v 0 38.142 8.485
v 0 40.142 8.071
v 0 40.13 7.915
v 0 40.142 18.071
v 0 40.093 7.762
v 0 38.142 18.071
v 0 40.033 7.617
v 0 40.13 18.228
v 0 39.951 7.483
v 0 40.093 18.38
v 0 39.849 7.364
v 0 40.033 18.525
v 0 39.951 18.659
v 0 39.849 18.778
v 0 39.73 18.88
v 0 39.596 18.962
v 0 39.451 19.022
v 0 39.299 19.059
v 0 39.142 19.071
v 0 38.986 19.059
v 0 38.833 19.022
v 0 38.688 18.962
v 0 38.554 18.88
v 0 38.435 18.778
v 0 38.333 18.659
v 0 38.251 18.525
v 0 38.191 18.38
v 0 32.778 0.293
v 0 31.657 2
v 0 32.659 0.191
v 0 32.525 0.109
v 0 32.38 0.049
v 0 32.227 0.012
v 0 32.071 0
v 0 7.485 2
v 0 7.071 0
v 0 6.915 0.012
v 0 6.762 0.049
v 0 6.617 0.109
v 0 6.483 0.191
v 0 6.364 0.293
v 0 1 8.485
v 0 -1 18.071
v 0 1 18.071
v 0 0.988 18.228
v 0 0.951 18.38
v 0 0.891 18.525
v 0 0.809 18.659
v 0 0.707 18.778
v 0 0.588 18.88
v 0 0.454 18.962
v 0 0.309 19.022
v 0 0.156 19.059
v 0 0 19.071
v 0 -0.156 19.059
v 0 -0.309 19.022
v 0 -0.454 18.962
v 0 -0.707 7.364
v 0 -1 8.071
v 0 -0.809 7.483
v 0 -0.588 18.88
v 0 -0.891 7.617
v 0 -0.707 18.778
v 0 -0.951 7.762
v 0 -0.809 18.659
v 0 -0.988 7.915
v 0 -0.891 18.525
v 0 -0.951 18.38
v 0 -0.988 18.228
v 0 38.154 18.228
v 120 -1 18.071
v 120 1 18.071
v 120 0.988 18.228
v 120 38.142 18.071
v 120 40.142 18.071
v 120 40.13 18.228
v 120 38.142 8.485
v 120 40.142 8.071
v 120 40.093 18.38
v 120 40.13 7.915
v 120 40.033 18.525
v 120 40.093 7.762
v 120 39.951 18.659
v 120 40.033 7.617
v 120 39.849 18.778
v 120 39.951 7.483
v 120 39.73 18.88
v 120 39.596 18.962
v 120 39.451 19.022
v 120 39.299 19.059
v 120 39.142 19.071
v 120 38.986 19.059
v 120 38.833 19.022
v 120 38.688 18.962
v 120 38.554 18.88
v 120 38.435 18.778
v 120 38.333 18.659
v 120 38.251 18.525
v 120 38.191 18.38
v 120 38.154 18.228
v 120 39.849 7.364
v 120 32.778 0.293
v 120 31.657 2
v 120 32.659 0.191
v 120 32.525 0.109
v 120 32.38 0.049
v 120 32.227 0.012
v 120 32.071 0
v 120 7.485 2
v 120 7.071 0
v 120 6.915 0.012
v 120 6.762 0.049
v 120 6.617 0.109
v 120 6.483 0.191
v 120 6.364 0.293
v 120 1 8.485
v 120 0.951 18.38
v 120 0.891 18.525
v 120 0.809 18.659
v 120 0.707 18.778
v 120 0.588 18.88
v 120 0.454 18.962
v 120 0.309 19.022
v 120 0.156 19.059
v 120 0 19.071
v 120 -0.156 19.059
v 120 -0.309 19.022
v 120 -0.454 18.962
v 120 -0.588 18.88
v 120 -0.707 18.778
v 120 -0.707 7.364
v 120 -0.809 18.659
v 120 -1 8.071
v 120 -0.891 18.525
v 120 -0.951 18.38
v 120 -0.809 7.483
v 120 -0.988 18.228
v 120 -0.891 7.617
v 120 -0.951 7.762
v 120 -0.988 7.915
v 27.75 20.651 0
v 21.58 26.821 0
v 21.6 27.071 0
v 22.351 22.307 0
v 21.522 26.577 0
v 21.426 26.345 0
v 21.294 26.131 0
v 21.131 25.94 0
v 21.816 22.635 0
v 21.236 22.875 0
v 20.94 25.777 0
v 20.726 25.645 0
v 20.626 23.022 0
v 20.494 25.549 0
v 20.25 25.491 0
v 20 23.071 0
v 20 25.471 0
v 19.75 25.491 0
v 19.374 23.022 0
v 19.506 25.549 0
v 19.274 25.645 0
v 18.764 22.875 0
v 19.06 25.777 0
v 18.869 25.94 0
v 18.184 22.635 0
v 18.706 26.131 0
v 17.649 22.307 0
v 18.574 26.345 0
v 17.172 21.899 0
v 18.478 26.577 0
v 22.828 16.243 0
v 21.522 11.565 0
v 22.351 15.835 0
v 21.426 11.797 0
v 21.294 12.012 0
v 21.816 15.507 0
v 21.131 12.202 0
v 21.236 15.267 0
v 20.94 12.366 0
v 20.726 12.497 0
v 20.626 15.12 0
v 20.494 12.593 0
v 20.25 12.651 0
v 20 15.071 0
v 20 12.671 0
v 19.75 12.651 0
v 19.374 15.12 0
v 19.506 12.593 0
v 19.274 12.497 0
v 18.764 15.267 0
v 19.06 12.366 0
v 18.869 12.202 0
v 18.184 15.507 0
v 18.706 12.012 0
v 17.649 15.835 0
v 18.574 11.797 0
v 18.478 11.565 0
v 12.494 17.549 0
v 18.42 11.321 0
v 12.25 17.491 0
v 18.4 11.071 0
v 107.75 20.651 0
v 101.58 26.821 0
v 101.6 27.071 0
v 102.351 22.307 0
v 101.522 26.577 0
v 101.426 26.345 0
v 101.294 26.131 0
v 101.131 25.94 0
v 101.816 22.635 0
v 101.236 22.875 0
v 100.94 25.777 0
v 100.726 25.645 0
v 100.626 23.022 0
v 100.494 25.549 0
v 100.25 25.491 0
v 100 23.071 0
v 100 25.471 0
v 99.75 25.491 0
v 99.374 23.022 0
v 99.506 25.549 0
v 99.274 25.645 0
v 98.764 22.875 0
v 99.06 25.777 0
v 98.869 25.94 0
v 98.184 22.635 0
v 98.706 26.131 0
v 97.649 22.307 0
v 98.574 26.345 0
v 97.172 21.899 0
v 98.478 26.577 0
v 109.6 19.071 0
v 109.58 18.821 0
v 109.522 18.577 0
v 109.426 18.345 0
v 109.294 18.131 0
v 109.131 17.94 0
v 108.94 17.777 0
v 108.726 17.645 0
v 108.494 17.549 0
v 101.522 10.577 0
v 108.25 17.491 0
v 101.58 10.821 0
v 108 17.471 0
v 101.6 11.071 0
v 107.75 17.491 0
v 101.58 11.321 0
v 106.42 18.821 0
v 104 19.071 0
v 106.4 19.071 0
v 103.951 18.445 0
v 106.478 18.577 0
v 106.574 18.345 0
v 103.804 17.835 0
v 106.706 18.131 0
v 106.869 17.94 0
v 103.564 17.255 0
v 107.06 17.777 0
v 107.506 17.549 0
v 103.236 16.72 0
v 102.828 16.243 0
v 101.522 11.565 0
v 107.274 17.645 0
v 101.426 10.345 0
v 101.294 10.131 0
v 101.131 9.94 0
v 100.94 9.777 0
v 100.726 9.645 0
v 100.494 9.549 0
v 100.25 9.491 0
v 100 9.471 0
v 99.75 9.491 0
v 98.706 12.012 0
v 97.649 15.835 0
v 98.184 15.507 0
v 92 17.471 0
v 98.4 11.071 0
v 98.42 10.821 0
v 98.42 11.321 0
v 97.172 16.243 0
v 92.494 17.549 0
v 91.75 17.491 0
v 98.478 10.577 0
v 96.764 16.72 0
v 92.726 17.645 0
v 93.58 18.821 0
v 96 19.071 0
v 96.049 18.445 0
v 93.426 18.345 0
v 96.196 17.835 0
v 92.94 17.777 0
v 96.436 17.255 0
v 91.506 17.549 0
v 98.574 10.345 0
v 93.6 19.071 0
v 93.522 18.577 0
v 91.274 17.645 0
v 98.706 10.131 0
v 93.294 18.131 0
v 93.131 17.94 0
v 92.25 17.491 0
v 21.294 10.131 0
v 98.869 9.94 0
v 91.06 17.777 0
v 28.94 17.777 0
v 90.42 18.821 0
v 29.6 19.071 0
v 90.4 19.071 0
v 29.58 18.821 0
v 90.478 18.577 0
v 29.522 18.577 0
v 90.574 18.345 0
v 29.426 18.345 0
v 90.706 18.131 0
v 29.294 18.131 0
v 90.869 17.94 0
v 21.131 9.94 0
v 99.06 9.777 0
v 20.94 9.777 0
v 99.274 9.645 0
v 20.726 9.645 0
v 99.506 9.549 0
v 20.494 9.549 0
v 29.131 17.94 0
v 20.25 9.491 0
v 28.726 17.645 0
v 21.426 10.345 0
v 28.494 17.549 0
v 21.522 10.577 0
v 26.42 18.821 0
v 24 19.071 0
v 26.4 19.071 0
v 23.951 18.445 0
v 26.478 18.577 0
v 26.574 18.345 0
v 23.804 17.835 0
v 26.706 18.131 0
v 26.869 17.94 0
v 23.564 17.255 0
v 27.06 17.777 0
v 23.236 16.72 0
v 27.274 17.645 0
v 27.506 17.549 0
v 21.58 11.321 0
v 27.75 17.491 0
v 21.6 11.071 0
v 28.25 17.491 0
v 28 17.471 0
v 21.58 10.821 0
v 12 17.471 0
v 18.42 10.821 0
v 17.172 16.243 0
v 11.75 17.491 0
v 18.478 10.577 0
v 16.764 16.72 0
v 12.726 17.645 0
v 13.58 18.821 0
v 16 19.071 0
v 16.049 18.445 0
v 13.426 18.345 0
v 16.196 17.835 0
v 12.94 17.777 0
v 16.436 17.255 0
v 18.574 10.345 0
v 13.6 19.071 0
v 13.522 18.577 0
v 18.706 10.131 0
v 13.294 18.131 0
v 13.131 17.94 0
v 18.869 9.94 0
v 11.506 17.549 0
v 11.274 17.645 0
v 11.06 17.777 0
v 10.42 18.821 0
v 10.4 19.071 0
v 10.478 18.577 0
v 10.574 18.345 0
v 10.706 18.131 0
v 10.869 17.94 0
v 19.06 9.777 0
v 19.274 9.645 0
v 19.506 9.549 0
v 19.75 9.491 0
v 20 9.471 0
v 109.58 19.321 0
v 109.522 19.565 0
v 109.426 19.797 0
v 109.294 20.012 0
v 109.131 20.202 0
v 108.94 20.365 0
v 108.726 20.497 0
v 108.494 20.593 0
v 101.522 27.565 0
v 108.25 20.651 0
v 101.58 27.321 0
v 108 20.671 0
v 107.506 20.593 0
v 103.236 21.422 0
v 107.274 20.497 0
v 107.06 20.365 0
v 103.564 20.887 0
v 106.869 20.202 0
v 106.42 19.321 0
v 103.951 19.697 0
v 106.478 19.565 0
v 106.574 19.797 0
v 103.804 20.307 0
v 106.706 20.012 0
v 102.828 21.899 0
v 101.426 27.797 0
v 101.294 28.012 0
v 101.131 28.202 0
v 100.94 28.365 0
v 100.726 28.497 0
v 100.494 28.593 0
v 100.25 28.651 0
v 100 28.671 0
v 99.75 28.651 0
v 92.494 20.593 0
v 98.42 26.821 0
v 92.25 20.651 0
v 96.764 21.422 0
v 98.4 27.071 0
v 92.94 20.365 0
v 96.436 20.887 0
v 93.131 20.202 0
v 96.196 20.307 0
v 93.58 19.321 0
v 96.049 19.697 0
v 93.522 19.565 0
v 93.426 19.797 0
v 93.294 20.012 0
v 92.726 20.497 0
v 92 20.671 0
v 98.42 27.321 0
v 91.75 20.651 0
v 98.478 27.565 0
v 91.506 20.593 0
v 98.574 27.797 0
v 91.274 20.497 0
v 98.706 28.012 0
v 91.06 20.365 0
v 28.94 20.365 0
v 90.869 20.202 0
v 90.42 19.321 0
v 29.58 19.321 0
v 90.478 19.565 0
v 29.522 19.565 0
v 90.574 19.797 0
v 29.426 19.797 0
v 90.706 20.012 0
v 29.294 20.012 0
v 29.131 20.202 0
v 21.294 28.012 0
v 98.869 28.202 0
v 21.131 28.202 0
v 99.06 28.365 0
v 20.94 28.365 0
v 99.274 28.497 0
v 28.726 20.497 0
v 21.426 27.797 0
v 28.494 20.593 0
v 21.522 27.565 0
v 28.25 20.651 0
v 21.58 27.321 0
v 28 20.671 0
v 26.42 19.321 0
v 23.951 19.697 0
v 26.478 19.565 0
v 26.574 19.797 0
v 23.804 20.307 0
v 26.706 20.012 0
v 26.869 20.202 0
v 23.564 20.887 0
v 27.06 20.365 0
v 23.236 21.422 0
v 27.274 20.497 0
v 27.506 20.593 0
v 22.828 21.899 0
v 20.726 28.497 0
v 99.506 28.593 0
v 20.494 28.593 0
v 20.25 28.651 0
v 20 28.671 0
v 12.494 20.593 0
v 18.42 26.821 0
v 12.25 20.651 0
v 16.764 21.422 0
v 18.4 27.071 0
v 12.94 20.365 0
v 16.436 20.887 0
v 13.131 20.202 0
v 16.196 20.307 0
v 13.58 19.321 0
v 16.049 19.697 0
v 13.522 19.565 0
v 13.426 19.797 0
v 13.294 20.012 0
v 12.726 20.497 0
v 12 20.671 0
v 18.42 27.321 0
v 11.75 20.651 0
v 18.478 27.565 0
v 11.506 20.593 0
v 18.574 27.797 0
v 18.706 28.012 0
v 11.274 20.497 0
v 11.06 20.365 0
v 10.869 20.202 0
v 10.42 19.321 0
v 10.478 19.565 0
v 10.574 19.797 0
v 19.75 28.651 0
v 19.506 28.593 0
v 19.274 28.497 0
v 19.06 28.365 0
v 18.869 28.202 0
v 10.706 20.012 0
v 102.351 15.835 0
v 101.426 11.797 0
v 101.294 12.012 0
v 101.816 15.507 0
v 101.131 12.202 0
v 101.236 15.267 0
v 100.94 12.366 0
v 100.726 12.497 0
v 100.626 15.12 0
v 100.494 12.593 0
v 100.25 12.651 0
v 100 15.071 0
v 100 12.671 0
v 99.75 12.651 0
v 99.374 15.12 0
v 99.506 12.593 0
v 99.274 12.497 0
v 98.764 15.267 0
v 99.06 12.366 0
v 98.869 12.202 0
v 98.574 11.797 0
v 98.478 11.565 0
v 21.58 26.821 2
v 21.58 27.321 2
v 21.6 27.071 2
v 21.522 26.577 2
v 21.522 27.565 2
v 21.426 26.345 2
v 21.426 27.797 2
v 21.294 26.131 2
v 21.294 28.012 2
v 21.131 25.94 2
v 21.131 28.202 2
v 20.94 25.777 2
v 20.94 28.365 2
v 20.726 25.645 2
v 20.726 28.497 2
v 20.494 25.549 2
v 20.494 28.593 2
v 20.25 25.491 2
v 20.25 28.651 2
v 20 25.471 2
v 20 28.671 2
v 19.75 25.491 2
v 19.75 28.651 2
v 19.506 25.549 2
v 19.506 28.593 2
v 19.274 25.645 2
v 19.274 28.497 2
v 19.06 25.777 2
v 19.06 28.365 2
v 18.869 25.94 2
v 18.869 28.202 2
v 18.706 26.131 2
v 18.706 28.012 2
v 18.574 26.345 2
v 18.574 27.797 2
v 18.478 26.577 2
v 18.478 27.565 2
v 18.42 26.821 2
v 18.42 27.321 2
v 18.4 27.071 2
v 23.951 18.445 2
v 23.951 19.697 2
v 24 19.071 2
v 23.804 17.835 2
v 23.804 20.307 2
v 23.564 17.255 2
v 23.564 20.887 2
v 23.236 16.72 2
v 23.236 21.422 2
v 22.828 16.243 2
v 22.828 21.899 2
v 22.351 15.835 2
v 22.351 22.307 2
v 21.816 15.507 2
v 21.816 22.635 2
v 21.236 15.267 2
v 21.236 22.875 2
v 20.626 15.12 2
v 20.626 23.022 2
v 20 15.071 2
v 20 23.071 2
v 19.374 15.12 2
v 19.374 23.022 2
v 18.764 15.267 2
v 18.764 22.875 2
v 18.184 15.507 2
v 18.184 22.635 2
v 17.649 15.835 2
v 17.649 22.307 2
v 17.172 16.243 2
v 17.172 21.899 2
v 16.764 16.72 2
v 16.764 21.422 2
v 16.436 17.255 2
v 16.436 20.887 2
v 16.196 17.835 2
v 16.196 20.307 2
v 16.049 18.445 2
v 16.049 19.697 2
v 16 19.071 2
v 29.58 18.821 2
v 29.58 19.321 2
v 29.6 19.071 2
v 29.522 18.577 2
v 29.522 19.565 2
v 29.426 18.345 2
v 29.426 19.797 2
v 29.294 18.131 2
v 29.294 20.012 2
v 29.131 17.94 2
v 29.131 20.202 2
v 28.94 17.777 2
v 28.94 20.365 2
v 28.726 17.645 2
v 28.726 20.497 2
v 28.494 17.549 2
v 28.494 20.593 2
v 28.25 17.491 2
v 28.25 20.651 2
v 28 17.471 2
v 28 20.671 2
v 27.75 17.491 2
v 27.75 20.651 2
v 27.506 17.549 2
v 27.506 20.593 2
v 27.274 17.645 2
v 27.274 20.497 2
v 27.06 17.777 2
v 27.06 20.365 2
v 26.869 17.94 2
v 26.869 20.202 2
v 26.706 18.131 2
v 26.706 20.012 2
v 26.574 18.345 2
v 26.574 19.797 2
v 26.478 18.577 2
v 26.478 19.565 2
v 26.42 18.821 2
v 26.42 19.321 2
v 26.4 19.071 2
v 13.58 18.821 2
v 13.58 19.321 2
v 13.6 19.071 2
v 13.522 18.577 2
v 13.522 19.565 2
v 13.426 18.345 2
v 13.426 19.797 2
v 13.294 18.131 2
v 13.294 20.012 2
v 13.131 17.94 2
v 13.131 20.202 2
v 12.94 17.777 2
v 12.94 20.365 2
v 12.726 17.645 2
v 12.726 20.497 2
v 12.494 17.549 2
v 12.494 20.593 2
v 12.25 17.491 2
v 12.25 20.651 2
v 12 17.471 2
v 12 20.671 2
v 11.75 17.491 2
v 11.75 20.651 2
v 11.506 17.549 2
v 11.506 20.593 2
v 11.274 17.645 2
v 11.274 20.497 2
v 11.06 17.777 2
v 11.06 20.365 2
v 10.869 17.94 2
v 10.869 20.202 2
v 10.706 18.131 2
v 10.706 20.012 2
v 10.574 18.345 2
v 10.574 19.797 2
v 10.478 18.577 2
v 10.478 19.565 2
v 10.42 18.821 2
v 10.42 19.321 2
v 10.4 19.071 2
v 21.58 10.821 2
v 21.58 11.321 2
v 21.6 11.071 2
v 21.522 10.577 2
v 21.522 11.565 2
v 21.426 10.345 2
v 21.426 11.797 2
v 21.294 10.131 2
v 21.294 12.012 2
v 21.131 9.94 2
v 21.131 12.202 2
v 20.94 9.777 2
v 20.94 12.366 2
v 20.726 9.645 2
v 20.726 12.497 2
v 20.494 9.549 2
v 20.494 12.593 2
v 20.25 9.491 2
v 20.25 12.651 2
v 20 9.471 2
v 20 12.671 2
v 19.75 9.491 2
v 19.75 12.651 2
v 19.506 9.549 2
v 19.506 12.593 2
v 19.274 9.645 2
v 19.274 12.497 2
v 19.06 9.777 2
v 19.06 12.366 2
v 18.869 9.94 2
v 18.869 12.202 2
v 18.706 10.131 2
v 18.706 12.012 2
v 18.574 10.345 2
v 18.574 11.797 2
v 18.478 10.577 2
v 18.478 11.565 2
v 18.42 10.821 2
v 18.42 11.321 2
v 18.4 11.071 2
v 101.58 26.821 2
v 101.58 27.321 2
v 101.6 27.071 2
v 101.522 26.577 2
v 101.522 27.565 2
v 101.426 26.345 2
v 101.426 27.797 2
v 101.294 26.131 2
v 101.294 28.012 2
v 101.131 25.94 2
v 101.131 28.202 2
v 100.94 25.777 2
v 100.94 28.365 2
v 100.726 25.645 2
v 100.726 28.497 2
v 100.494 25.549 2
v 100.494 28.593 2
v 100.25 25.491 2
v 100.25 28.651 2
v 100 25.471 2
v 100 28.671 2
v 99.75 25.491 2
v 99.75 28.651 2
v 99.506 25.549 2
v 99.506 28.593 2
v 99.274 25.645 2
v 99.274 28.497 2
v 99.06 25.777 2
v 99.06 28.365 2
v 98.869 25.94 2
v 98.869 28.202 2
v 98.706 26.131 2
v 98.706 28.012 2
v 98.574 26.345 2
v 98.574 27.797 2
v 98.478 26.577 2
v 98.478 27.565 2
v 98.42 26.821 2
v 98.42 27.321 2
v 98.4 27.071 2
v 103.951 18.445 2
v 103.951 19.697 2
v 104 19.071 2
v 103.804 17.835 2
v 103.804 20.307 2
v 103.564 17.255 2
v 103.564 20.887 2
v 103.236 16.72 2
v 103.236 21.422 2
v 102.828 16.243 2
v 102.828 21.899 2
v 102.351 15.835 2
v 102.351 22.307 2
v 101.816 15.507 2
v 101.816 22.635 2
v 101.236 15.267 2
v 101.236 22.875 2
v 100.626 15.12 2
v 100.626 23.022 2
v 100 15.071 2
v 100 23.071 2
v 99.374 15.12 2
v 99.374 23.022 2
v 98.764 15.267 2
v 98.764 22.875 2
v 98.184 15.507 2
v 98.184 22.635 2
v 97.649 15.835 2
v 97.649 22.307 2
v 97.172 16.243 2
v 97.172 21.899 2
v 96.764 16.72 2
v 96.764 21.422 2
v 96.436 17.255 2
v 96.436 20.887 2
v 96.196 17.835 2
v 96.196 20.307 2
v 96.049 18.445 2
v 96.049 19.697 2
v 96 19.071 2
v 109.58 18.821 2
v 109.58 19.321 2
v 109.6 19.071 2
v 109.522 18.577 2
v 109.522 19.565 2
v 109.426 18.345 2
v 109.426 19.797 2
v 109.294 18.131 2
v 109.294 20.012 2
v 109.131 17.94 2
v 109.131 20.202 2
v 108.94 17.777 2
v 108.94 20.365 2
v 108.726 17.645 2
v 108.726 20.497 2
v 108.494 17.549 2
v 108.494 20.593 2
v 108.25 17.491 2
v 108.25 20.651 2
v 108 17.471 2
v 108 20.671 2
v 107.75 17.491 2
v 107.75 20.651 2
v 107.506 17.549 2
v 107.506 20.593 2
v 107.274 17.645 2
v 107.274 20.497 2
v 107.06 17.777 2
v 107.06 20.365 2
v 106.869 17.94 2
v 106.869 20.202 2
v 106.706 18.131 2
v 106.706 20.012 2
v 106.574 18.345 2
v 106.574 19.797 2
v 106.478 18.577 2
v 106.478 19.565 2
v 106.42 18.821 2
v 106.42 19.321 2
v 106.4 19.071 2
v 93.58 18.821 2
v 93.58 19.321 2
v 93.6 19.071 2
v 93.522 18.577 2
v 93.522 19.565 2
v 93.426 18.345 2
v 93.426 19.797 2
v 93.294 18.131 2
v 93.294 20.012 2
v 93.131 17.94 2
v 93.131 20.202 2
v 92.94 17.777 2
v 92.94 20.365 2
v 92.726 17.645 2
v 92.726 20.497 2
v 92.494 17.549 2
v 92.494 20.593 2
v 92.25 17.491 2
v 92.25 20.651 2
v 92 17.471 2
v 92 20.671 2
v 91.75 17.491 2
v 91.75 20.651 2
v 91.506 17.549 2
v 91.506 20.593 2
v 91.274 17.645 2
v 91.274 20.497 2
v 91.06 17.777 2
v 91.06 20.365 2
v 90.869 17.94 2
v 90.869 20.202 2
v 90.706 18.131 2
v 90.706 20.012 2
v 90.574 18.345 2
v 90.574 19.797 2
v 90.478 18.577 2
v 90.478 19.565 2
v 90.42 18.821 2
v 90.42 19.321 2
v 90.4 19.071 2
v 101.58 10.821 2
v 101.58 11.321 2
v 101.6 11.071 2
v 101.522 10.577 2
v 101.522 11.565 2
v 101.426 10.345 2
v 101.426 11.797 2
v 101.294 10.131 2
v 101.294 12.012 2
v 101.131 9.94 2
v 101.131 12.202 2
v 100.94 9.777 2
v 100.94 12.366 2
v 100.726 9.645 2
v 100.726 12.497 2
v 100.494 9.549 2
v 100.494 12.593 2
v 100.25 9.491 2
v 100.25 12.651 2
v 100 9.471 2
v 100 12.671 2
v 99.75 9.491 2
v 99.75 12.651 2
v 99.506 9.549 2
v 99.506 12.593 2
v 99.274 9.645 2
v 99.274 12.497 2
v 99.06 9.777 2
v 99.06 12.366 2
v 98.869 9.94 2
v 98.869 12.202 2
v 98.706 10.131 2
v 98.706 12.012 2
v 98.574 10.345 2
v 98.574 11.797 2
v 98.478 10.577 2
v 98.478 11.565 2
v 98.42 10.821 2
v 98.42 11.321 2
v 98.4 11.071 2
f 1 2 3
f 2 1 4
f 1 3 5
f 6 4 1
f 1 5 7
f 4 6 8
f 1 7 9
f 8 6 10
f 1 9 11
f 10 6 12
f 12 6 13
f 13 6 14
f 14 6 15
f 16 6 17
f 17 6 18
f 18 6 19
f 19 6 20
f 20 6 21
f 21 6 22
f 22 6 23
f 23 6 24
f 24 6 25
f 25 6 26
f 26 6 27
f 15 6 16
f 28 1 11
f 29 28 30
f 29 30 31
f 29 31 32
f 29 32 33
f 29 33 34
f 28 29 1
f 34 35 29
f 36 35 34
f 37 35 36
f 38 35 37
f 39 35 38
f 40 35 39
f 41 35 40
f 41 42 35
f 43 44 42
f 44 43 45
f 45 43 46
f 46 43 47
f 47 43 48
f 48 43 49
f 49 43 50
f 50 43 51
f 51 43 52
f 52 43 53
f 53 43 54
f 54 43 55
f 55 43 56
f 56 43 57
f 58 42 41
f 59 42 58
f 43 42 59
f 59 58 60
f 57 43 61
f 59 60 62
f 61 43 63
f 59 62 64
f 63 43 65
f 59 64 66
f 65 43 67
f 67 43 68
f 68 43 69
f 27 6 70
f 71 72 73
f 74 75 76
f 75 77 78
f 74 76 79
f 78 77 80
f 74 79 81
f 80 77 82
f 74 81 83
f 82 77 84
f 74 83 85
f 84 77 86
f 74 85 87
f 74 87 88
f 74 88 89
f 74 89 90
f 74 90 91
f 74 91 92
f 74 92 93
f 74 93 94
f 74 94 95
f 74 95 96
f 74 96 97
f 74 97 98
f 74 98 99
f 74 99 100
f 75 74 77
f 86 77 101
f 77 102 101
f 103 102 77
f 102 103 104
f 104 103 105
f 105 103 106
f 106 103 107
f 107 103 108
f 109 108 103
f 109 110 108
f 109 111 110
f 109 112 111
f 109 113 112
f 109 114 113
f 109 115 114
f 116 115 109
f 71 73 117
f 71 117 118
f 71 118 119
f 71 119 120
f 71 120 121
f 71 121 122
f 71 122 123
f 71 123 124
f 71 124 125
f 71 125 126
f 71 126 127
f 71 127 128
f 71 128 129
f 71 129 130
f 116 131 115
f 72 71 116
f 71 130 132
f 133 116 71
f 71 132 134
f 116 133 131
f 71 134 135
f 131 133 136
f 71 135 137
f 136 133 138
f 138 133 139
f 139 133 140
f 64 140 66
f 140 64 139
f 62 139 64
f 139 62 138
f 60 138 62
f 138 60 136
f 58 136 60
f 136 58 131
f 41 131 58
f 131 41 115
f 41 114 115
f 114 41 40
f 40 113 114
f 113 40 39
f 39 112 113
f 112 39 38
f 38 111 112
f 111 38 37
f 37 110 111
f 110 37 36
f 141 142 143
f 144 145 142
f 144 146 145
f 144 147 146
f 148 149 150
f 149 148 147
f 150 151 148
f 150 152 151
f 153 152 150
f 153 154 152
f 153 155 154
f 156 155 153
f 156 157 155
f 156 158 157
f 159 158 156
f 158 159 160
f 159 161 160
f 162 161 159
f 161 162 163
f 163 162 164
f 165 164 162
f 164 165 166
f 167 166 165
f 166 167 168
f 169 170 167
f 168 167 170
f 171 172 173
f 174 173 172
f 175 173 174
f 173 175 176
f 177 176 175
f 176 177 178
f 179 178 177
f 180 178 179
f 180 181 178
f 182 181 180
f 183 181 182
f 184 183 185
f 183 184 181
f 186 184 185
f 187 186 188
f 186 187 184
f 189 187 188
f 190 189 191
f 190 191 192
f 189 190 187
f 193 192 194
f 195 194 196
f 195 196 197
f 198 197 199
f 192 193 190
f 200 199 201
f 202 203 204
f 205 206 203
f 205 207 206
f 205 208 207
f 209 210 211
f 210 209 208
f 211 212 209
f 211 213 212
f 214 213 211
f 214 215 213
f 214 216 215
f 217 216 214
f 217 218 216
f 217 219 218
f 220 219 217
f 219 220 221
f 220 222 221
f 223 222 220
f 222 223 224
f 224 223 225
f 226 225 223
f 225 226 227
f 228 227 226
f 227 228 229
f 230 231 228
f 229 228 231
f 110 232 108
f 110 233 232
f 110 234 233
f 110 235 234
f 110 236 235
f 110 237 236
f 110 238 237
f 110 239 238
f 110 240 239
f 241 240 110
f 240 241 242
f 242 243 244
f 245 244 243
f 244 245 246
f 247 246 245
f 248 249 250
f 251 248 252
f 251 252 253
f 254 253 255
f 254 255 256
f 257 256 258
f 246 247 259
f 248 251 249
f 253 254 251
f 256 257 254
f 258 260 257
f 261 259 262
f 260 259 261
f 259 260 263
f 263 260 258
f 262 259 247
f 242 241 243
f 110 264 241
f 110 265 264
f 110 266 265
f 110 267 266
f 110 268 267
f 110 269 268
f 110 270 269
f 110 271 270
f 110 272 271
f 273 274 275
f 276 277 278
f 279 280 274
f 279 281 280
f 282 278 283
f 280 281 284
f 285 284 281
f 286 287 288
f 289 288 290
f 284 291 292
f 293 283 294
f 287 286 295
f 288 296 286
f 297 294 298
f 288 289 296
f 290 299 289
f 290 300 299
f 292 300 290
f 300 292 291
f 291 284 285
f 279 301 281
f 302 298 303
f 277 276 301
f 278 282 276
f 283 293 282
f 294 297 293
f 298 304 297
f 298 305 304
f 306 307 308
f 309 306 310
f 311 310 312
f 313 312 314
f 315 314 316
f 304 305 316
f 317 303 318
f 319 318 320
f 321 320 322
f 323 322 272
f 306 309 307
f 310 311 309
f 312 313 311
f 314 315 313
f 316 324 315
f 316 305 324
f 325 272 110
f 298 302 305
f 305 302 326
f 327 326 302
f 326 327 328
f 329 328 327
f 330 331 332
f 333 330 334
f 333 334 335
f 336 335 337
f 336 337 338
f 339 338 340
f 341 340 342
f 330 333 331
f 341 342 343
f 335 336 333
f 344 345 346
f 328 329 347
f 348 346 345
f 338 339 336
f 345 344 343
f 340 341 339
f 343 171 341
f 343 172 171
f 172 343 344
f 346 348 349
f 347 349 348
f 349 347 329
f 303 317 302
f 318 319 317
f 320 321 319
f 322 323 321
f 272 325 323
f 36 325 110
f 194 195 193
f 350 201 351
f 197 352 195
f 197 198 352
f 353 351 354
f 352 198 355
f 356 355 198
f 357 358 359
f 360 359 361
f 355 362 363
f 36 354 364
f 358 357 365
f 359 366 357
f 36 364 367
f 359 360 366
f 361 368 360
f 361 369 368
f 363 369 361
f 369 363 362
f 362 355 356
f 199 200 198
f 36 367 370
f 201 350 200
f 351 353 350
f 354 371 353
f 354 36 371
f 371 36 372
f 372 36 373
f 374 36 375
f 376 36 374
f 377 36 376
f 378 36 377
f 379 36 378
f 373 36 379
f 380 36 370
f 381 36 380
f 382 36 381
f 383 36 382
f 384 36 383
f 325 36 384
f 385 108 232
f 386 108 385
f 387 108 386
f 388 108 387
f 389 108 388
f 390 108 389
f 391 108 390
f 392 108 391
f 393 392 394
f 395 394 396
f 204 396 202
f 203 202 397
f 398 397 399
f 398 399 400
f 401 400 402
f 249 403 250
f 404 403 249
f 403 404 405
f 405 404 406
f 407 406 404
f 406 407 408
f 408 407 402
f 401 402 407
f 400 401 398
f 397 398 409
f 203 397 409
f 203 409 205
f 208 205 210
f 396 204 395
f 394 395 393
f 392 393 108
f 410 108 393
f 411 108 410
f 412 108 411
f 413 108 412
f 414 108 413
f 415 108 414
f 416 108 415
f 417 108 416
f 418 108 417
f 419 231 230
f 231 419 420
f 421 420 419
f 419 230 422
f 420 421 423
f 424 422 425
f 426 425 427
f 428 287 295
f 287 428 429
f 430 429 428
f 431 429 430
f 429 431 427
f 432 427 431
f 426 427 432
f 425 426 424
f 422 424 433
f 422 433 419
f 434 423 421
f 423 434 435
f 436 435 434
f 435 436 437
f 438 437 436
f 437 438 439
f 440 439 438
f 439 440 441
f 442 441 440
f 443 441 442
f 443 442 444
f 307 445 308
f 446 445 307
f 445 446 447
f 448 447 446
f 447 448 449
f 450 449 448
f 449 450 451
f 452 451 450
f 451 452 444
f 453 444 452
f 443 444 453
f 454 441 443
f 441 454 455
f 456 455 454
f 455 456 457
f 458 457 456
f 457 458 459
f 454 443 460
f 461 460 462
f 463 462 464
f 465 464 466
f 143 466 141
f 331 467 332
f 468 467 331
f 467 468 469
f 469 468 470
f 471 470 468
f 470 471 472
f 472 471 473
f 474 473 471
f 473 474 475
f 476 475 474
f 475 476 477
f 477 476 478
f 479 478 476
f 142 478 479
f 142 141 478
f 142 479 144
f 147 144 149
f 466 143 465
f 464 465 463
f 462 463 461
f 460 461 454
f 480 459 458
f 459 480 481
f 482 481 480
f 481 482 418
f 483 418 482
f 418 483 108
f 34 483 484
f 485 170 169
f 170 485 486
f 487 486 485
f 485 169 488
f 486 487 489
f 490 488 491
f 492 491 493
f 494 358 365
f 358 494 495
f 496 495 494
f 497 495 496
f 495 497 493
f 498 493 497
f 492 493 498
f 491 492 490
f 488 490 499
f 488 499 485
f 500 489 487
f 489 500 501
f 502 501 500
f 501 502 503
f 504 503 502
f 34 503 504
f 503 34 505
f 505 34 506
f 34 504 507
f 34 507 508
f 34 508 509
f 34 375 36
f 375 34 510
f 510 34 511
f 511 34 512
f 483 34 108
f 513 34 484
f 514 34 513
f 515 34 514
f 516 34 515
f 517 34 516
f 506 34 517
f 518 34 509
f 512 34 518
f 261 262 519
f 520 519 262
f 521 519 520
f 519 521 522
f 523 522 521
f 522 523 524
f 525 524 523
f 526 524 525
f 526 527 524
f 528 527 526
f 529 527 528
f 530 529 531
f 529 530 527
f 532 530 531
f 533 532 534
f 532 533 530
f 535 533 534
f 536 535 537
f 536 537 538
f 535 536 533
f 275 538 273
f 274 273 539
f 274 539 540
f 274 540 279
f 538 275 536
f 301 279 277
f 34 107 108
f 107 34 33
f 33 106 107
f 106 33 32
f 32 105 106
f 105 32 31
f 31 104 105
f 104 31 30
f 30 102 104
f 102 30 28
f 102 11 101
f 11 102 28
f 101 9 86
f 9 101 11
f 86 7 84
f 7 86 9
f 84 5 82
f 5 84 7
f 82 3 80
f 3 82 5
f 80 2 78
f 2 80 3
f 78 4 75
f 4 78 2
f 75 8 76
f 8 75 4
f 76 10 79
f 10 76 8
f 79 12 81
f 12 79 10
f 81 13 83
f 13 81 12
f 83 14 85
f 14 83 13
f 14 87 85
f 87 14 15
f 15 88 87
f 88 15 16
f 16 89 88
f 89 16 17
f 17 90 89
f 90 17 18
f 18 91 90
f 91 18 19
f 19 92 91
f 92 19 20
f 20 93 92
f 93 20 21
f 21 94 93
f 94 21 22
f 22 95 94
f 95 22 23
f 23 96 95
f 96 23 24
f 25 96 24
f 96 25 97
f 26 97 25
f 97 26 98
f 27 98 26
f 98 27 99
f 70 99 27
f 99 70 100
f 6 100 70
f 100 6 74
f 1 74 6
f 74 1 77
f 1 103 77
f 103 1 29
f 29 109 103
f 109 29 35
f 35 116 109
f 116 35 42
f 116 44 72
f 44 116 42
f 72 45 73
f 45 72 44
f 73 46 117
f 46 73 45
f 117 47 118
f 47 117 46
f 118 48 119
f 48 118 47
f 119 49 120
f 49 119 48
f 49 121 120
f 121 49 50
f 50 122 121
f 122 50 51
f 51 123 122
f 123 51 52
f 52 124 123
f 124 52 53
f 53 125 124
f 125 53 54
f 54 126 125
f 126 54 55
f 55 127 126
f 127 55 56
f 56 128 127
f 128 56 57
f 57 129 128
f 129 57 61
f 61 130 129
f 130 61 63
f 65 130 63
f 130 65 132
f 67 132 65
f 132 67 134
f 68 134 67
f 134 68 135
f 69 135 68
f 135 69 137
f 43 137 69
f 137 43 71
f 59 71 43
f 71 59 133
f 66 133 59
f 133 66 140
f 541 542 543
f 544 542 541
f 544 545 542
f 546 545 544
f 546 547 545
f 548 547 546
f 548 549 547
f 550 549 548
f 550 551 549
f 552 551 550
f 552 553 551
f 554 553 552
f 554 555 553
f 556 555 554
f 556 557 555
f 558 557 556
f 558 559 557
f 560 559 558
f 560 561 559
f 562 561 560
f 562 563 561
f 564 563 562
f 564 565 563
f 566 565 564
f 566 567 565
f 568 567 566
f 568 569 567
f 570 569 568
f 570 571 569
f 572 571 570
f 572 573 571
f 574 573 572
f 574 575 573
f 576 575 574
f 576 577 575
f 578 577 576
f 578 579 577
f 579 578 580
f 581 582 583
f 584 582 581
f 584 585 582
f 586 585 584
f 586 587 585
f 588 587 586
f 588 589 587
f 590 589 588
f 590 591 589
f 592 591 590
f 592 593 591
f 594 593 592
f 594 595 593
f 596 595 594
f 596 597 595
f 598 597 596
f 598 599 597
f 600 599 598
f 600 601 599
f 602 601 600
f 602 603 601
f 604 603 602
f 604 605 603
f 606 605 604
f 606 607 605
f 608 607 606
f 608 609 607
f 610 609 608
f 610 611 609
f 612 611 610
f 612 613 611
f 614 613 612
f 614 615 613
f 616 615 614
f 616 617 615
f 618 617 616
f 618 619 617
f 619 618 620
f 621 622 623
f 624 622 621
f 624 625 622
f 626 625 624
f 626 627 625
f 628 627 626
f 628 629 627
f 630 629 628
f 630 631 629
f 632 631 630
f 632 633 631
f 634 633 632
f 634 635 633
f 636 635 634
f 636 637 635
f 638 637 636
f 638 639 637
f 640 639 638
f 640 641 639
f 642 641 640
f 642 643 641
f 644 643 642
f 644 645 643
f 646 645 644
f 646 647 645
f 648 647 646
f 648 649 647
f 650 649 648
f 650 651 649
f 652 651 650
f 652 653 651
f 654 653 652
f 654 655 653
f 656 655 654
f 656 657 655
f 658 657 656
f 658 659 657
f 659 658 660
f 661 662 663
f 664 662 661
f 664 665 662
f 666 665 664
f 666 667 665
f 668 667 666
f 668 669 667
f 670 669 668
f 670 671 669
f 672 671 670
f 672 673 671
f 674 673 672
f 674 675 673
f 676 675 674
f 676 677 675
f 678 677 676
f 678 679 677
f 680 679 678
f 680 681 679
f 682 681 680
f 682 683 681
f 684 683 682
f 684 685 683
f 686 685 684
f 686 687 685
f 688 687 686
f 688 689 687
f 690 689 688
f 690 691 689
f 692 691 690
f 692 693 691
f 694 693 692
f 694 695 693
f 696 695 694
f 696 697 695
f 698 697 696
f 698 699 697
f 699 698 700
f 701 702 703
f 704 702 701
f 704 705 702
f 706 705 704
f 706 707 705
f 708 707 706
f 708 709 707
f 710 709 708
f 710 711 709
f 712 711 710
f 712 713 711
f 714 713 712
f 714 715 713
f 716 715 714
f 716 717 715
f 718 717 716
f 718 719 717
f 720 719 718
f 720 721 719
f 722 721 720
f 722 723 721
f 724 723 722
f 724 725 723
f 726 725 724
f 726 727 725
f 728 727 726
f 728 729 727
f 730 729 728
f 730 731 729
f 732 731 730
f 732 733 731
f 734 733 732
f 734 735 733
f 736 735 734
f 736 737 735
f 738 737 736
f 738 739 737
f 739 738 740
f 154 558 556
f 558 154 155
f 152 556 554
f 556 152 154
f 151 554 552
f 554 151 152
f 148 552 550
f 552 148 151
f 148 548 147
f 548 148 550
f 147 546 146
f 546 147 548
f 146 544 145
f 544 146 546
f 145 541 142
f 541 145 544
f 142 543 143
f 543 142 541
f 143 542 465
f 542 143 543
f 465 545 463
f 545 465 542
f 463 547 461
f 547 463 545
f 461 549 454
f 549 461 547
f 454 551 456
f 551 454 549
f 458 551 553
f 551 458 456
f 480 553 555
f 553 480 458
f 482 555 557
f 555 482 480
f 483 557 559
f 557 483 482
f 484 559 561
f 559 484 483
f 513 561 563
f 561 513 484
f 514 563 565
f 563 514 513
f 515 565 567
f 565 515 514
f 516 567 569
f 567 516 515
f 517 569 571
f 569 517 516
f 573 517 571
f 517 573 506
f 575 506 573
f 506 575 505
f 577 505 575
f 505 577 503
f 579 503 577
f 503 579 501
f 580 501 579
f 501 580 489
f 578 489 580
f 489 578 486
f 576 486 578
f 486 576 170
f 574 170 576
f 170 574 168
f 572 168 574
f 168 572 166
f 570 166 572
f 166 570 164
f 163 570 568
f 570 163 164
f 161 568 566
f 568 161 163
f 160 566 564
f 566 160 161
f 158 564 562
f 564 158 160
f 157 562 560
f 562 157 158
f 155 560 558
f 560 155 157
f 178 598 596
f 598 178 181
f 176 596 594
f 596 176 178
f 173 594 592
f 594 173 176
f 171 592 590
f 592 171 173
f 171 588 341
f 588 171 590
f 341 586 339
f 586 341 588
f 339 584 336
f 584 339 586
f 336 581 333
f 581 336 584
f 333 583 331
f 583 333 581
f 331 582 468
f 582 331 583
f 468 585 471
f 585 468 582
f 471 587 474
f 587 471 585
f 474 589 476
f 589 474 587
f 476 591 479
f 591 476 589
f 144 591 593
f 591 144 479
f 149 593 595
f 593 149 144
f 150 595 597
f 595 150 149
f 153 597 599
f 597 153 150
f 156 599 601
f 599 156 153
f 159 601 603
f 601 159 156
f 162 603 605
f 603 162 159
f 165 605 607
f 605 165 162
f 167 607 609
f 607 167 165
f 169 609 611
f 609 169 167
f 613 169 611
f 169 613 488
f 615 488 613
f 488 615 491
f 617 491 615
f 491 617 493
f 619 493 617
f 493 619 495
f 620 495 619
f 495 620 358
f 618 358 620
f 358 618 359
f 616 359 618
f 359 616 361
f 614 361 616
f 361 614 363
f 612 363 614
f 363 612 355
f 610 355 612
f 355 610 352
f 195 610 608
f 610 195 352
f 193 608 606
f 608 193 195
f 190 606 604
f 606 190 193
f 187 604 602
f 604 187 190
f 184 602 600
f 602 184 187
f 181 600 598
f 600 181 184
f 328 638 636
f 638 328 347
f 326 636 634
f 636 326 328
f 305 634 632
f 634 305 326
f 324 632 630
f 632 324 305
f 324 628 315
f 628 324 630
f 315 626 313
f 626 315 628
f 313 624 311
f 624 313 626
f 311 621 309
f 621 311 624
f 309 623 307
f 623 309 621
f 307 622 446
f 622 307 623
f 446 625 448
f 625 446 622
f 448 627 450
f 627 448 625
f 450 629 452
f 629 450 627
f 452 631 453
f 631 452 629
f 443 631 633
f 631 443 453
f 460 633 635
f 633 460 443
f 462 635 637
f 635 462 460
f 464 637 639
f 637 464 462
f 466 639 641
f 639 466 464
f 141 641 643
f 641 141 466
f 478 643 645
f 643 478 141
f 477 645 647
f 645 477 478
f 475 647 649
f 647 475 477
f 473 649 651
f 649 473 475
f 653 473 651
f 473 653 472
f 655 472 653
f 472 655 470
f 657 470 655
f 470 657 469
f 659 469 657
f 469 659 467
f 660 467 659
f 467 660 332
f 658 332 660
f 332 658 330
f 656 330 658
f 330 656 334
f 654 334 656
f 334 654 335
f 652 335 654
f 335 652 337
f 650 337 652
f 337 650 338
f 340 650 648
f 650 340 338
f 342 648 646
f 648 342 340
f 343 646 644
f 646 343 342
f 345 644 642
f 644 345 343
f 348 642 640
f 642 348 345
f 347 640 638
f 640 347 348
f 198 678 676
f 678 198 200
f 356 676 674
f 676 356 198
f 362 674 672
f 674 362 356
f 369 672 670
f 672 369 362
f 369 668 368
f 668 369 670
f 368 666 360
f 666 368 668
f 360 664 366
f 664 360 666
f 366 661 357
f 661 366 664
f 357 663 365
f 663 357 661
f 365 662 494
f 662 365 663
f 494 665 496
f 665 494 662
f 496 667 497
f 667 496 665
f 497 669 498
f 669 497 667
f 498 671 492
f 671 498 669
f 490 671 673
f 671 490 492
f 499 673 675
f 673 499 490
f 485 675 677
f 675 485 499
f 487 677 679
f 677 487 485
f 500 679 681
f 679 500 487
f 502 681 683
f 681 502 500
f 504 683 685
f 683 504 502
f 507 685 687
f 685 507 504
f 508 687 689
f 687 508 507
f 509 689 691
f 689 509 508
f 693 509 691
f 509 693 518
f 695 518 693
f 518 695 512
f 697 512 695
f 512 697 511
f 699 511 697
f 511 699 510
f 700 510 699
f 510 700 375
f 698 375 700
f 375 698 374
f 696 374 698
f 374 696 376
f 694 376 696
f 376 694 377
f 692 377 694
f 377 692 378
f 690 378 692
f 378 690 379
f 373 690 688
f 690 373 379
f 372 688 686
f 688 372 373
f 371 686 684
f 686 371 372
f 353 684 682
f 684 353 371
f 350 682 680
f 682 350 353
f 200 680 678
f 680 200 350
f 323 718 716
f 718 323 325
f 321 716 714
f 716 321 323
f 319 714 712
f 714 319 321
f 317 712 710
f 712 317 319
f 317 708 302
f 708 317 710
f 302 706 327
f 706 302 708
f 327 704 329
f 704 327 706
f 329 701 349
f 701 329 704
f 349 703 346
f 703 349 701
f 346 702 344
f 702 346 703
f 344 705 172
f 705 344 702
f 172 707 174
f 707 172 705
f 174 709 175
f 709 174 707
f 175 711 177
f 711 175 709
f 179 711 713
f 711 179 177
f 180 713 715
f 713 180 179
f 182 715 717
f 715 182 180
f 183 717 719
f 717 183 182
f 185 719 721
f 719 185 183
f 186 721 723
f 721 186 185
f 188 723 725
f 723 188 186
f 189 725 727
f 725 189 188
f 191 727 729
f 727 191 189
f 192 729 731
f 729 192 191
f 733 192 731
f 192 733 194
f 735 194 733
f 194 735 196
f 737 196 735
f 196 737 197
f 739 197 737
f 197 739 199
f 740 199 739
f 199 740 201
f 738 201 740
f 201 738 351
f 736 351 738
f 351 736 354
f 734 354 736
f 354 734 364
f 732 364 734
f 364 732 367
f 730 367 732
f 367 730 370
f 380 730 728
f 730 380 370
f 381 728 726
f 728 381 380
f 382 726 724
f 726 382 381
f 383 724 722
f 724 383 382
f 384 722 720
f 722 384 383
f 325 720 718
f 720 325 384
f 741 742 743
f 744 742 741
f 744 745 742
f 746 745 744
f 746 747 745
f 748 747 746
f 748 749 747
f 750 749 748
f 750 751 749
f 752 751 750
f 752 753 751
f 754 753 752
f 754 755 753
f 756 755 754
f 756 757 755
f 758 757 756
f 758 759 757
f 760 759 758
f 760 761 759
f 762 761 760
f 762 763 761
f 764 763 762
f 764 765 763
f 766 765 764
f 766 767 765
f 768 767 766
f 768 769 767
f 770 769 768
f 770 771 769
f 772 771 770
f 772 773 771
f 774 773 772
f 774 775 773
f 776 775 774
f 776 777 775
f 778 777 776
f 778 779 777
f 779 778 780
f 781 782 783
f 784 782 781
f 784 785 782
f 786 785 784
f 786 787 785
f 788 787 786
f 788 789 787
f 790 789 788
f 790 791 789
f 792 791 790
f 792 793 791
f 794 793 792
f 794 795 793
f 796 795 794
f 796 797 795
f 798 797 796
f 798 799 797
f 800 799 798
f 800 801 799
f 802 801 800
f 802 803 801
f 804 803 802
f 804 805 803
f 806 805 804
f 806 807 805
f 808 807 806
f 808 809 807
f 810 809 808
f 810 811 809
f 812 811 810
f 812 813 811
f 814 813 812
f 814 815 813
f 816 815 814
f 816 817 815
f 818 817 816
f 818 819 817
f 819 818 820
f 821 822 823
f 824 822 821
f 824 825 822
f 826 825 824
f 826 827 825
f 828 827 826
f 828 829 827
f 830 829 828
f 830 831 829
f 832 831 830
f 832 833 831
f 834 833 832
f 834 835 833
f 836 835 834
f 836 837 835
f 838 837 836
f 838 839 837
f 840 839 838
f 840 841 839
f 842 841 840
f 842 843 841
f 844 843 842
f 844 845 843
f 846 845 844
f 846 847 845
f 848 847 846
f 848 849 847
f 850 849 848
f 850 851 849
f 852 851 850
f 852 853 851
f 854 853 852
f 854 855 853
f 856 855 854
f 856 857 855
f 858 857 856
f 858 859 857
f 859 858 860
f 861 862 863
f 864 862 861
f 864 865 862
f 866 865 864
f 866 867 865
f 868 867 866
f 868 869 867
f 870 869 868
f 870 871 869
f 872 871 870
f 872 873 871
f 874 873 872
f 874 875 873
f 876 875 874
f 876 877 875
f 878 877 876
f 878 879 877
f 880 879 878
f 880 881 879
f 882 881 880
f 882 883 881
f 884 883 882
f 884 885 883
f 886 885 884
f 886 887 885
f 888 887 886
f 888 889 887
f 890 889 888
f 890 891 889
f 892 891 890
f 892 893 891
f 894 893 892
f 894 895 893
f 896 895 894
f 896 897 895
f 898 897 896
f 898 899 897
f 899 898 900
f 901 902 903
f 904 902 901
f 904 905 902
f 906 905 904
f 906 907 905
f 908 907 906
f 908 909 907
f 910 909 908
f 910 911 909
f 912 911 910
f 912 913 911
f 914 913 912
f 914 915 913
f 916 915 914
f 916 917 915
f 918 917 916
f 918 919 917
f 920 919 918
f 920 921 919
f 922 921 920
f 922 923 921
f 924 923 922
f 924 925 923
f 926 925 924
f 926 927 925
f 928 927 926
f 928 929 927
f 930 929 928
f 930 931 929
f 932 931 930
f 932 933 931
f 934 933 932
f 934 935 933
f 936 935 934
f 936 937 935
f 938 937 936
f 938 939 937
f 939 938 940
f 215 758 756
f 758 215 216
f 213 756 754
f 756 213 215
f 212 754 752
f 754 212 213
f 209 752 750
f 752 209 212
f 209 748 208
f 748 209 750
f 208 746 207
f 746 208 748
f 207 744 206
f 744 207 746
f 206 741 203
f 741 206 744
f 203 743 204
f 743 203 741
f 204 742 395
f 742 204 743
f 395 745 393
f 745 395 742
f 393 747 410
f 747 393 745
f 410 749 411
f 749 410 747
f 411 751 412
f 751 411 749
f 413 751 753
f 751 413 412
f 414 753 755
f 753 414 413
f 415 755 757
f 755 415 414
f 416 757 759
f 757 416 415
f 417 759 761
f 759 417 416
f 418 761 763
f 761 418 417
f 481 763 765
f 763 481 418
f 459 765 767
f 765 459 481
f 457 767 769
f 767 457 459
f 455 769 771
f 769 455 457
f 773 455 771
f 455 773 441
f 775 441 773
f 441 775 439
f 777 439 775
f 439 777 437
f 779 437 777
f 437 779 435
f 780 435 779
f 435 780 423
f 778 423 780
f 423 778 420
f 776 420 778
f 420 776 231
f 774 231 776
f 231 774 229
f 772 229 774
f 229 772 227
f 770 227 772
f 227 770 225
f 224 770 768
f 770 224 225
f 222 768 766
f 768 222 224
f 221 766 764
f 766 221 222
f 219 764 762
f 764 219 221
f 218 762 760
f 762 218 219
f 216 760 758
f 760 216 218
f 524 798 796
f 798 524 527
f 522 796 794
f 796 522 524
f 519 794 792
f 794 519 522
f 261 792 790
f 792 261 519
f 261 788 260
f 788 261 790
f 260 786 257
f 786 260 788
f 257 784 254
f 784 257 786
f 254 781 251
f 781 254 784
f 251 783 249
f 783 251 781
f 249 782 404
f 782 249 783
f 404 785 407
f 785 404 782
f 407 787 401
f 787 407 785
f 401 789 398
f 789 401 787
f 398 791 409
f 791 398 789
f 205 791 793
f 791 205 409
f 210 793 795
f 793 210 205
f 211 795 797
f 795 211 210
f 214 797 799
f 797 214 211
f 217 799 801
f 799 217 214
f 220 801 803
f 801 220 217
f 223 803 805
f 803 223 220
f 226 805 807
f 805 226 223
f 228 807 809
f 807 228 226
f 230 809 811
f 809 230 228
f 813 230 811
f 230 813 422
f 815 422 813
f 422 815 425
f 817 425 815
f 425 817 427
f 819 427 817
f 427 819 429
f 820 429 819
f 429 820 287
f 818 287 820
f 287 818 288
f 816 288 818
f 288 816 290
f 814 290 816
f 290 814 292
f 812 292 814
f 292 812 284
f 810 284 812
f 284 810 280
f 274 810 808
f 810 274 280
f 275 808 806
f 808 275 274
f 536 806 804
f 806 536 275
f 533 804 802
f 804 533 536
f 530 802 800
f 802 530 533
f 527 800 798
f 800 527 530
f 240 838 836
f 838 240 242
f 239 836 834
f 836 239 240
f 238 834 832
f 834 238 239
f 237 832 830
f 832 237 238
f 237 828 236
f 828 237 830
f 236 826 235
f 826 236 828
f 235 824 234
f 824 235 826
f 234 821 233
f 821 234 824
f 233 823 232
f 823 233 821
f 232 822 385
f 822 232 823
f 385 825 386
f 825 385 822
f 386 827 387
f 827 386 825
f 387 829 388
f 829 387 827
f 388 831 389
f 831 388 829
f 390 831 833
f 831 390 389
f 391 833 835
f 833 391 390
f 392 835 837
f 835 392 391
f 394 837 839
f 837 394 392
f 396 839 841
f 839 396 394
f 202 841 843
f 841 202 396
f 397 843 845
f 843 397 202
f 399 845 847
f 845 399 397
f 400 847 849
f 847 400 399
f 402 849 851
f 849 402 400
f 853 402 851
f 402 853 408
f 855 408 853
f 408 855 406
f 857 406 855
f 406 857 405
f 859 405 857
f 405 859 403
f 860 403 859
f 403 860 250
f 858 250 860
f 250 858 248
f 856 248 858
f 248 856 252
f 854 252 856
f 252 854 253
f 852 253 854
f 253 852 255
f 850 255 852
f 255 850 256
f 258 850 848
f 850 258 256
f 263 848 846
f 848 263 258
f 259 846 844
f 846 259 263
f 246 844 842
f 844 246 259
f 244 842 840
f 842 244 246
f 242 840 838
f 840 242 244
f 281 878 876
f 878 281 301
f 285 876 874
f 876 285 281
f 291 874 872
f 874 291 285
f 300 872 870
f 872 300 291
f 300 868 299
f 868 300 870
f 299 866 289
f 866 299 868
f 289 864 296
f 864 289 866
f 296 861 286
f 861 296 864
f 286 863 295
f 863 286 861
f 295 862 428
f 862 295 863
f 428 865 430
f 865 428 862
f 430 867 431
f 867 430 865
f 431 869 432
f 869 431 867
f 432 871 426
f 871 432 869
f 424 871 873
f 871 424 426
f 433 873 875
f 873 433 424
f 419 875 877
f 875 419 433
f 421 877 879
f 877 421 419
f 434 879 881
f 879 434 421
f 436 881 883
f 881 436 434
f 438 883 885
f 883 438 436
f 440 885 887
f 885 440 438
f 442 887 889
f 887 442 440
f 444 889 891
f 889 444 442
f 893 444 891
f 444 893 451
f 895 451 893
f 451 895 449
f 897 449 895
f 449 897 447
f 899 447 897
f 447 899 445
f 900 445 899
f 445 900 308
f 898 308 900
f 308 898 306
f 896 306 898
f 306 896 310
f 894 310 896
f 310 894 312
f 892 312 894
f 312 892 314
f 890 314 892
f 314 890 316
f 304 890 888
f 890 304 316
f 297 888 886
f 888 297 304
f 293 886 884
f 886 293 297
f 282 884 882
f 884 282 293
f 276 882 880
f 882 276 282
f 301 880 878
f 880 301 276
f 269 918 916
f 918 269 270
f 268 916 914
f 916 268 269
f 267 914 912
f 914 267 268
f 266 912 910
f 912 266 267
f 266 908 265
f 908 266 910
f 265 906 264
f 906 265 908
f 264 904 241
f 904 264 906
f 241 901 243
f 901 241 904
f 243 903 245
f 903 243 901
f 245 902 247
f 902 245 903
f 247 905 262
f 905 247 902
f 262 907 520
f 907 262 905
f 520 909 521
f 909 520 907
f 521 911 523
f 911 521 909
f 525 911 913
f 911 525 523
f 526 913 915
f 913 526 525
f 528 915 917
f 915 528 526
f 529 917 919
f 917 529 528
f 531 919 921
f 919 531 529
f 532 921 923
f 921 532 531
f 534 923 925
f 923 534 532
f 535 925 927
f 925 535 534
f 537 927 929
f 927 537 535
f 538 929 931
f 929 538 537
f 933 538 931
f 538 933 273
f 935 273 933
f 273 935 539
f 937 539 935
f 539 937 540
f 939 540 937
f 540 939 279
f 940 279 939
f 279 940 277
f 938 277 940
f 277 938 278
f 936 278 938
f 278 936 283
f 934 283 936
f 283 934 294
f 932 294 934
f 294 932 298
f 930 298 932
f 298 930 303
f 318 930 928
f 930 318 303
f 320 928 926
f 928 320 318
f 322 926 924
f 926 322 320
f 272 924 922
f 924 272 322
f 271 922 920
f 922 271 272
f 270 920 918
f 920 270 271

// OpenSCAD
$fn = 40;

difference() {
	translate(v = [0, 0, 18.0710678119]) {
		rotate(a = [0, 90, 0]) {
			linear_extrude(convexity = 4, height = 120) {
				union() {
					hull() {
						translate(v = [0, 0]) {
							circle(r = 1);
						}
						translate(v = [10, 0]) {
							circle(r = 1);
						}
					}
					union() {
						hull() {
							translate(v = [10, 0]) {
								circle(r = 1);
							}
							translate(v = [17.0710678119, 7.0710678119]) {
								circle(r = 1);
							}
						}
						union() {
							hull() {
								translate(v = [17.0710678119, 7.0710678119]) {
									circle(r = 1);
								}
								translate(v = [17.0710678119, 32.0710678119]) {
									circle(r = 1);
								}
							}
							union() {
								hull() {
									translate(v = [17.0710678119, 32.0710678119]) {
										circle(r = 1);
									}
									translate(v = [10.0000000000, 39.1421356237]) {
										circle(r = 1);
									}
								}
								hull() {
									translate(v = [10.0000000000, 39.1421356237]) {
										circle(r = 1);
									}
									translate(v = [0.0000000000, 39.1421356237]) {
										circle(r = 1);
									}
								}
							}
						}
					}
				}
			}
		}
	}
	translate(v = [20, 19.0710678119, 0]) {
		linear_extrude(height = 2) {
			union() {
				circle(r = 4);
				union() {
					union() {
						union() {
							translate(v = [8, 0, 0]) {
								circle(r = 1.6000000000);
							}
							rotate(a = [0, 0, 90.0000000000]) {
								translate(v = [8, 0, 0]) {
									circle(r = 1.6000000000);
								}
							}
						}
						rotate(a = [0, 0, 180.0000000000]) {
							translate(v = [8, 0, 0]) {
								circle(r = 1.6000000000);
							}
						}
					}
					rotate(a = [0, 0, 270.0000000000]) {
						translate(v = [8, 0, 0]) {
							circle(r = 1.6000000000);
						}
					}
				}
			}
		}
	}
	translate(v = [100, 19.0710678119, 0]) {
		linear_extrude(height = 2) {
			union() {
				circle(r = 4);
				union() {
					union() {
						union() {
							translate(v = [8, 0, 0]) {
								circle(r = 1.6000000000);
							}
							rotate(a = [0, 0, 90.0000000000]) {
								translate(v = [8, 0, 0]) {
									circle(r = 1.6000000000);
								}
							}
						}
						rotate(a = [0, 0, 180.0000000000]) {
							translate(v = [8, 0, 0]) {
								circle(r = 1.6000000000);
							}
						}
					}
					rotate(a = [0, 0, 270.0000000000]) {
						translate(v = [8, 0, 0]) {
							circle(r = 1.6000000000);
						}
					}
				}
			}
		}
	}
}
